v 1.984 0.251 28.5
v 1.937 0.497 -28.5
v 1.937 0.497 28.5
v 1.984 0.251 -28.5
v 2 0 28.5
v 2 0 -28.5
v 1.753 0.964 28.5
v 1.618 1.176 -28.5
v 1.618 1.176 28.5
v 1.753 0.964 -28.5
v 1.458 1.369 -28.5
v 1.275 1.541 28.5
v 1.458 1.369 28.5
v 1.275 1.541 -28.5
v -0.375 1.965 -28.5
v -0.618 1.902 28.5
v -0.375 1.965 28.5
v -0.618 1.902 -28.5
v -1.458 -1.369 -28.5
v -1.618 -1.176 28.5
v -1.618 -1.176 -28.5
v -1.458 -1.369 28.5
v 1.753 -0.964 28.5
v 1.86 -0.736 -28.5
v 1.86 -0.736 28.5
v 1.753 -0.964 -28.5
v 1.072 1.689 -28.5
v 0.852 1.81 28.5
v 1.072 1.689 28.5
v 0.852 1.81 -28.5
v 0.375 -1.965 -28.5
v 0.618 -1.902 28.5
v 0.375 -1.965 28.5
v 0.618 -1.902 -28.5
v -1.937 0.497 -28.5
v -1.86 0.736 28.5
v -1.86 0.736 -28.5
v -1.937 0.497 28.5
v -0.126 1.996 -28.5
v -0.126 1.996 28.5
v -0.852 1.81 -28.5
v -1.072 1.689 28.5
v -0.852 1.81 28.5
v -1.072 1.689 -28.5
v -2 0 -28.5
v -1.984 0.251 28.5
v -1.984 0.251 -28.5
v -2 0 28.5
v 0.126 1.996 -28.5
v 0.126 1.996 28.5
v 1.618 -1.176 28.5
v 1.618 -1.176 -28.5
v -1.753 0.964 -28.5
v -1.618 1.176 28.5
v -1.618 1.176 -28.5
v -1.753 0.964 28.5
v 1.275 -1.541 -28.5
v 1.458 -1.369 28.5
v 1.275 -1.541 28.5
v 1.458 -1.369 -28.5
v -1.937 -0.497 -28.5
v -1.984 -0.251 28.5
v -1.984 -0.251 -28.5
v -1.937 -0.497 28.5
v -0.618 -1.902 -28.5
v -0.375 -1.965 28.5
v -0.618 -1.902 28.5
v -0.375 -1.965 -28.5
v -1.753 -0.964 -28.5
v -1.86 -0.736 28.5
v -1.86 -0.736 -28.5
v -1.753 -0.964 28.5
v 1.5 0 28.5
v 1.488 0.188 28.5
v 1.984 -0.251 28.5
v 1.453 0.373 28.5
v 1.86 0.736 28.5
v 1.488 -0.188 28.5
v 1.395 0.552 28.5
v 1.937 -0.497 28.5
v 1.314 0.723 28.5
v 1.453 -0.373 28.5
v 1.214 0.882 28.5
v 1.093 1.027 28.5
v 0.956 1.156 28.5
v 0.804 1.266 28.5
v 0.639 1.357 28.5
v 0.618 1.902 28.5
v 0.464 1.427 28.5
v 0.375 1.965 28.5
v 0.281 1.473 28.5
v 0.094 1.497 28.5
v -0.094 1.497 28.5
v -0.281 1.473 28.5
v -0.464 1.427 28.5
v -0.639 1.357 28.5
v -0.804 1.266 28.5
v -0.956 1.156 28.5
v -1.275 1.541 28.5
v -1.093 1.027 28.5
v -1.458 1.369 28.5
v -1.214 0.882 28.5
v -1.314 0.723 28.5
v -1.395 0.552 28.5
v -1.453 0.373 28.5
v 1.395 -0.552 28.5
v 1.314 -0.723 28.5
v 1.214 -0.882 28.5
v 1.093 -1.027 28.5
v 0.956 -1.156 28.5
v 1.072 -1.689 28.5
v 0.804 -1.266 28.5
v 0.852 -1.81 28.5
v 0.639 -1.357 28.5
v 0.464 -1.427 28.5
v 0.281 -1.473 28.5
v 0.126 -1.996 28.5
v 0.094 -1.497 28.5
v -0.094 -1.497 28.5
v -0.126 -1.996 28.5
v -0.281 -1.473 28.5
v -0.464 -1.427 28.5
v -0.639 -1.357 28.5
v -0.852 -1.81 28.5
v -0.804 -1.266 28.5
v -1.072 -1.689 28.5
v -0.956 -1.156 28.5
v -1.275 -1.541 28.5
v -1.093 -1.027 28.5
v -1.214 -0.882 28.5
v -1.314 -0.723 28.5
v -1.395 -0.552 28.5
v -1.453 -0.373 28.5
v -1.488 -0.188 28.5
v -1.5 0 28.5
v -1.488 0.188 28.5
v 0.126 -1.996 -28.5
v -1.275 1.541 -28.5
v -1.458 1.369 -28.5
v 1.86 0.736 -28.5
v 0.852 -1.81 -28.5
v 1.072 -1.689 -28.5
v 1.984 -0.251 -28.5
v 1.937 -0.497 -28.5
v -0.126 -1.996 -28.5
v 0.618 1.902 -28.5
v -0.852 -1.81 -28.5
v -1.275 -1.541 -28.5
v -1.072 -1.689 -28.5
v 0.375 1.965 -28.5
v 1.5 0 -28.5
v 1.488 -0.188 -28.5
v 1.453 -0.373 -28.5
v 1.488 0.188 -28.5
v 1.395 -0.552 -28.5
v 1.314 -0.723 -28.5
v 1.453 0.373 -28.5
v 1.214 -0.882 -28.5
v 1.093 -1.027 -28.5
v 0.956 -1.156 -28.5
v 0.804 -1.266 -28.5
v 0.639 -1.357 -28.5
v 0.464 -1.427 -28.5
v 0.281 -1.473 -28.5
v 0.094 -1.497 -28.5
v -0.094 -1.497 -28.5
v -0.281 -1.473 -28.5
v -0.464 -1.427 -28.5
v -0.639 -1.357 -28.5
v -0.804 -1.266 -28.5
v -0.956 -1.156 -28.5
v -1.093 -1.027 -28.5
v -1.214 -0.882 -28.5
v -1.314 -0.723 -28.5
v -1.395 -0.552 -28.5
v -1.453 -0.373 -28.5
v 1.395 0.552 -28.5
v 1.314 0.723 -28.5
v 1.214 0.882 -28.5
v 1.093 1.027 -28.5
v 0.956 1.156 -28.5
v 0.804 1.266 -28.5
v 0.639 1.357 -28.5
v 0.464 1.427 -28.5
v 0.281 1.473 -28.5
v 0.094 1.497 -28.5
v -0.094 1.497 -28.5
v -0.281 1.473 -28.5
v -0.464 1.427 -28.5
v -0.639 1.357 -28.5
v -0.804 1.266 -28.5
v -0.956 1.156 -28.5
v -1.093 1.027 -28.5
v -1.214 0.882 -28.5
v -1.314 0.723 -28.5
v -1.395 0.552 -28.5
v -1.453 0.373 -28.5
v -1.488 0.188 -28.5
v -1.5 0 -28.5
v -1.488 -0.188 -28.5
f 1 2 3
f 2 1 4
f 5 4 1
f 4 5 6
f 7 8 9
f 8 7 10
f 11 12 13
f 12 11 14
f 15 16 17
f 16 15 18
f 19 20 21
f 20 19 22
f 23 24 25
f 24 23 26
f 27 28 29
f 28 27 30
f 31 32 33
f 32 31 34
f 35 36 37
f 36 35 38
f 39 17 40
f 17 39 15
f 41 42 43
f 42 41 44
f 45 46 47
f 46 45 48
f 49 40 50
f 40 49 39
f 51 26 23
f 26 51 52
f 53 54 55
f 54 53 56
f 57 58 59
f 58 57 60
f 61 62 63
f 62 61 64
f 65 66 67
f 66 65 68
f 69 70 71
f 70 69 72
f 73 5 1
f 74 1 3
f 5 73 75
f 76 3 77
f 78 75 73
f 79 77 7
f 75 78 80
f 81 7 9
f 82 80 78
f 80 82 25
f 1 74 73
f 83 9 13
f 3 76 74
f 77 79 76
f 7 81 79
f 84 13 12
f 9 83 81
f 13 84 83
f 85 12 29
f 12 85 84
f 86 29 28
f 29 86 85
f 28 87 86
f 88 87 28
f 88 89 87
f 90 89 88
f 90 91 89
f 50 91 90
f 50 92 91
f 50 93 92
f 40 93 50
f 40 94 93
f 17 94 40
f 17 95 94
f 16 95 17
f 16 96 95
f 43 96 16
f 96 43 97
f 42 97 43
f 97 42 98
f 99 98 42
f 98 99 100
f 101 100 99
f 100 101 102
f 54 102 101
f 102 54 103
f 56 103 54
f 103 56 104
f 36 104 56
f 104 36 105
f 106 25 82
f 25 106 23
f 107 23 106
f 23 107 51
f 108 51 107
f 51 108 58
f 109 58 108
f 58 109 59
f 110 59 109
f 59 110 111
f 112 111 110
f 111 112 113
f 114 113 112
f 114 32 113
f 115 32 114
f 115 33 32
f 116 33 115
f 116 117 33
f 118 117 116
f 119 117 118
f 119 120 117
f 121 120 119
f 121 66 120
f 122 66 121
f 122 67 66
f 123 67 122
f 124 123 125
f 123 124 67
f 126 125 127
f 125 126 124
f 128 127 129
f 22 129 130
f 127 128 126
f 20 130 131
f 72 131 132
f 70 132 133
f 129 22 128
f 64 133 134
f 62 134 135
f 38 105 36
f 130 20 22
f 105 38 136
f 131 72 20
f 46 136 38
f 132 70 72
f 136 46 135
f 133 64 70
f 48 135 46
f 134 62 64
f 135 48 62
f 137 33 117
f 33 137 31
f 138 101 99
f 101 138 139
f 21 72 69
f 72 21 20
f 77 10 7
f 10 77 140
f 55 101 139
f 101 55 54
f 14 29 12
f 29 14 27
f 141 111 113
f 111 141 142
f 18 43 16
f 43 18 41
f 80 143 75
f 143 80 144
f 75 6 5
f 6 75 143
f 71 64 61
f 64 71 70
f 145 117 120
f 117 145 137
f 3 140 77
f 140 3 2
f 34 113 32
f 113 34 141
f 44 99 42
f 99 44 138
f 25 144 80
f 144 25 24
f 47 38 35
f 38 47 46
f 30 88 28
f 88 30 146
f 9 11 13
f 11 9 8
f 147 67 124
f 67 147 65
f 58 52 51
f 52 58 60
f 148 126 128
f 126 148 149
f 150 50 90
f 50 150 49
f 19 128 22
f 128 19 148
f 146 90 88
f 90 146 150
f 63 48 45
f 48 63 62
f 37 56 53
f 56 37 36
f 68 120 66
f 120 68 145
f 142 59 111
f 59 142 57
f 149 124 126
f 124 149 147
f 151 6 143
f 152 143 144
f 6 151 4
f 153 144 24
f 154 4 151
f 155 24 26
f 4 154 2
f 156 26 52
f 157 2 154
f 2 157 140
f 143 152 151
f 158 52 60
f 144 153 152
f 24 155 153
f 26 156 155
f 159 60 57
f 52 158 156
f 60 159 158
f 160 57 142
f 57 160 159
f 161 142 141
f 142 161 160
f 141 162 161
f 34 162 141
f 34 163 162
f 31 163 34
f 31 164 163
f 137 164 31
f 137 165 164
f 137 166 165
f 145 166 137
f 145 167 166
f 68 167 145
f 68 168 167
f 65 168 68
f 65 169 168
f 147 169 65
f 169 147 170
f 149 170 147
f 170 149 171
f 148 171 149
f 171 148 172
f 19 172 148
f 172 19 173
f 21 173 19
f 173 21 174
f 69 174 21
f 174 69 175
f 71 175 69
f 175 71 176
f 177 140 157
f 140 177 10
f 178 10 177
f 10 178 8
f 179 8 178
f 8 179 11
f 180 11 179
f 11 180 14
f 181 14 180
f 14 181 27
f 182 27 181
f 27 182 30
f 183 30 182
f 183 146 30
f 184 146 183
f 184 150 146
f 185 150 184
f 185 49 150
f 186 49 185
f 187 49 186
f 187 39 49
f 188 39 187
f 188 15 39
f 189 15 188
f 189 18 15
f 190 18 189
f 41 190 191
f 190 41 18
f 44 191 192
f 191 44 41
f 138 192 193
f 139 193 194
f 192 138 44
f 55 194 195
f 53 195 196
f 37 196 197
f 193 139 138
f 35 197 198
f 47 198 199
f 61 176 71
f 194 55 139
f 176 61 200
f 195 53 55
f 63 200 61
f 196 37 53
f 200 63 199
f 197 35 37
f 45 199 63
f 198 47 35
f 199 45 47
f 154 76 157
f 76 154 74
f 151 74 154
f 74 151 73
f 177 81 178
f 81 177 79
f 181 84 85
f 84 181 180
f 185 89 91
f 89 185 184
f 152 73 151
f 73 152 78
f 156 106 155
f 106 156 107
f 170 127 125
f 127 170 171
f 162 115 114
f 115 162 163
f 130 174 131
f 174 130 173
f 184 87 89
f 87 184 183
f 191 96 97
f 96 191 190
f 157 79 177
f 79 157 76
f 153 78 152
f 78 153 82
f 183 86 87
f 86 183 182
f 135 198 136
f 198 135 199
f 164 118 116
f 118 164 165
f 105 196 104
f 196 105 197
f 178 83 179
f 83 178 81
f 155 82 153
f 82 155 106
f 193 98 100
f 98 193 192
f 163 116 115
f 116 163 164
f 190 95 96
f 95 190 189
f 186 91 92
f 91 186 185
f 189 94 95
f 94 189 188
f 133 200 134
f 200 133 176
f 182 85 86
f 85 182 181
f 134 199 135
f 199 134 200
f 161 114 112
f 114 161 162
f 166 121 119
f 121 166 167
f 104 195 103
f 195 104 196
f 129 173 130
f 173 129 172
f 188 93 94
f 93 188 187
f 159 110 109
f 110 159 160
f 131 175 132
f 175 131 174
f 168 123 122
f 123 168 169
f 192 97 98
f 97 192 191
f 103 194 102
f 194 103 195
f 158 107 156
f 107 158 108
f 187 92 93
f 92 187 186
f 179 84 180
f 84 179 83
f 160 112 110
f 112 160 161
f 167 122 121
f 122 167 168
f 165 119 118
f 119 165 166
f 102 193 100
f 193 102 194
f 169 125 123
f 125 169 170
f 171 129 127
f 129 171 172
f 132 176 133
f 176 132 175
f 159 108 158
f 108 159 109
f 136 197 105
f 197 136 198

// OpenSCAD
$fn = 50;


difference() {
	union() {
		translate(v = [0, 0, -28.5000000000]) {
			cylinder(h = 57, r = 2.0000000000);
		}
	}
	union() {
		translate(v = [0, 0, -100.0000000000]) {
			cylinder(h = 200, r = 1.5000000000);
		}
	}
}
